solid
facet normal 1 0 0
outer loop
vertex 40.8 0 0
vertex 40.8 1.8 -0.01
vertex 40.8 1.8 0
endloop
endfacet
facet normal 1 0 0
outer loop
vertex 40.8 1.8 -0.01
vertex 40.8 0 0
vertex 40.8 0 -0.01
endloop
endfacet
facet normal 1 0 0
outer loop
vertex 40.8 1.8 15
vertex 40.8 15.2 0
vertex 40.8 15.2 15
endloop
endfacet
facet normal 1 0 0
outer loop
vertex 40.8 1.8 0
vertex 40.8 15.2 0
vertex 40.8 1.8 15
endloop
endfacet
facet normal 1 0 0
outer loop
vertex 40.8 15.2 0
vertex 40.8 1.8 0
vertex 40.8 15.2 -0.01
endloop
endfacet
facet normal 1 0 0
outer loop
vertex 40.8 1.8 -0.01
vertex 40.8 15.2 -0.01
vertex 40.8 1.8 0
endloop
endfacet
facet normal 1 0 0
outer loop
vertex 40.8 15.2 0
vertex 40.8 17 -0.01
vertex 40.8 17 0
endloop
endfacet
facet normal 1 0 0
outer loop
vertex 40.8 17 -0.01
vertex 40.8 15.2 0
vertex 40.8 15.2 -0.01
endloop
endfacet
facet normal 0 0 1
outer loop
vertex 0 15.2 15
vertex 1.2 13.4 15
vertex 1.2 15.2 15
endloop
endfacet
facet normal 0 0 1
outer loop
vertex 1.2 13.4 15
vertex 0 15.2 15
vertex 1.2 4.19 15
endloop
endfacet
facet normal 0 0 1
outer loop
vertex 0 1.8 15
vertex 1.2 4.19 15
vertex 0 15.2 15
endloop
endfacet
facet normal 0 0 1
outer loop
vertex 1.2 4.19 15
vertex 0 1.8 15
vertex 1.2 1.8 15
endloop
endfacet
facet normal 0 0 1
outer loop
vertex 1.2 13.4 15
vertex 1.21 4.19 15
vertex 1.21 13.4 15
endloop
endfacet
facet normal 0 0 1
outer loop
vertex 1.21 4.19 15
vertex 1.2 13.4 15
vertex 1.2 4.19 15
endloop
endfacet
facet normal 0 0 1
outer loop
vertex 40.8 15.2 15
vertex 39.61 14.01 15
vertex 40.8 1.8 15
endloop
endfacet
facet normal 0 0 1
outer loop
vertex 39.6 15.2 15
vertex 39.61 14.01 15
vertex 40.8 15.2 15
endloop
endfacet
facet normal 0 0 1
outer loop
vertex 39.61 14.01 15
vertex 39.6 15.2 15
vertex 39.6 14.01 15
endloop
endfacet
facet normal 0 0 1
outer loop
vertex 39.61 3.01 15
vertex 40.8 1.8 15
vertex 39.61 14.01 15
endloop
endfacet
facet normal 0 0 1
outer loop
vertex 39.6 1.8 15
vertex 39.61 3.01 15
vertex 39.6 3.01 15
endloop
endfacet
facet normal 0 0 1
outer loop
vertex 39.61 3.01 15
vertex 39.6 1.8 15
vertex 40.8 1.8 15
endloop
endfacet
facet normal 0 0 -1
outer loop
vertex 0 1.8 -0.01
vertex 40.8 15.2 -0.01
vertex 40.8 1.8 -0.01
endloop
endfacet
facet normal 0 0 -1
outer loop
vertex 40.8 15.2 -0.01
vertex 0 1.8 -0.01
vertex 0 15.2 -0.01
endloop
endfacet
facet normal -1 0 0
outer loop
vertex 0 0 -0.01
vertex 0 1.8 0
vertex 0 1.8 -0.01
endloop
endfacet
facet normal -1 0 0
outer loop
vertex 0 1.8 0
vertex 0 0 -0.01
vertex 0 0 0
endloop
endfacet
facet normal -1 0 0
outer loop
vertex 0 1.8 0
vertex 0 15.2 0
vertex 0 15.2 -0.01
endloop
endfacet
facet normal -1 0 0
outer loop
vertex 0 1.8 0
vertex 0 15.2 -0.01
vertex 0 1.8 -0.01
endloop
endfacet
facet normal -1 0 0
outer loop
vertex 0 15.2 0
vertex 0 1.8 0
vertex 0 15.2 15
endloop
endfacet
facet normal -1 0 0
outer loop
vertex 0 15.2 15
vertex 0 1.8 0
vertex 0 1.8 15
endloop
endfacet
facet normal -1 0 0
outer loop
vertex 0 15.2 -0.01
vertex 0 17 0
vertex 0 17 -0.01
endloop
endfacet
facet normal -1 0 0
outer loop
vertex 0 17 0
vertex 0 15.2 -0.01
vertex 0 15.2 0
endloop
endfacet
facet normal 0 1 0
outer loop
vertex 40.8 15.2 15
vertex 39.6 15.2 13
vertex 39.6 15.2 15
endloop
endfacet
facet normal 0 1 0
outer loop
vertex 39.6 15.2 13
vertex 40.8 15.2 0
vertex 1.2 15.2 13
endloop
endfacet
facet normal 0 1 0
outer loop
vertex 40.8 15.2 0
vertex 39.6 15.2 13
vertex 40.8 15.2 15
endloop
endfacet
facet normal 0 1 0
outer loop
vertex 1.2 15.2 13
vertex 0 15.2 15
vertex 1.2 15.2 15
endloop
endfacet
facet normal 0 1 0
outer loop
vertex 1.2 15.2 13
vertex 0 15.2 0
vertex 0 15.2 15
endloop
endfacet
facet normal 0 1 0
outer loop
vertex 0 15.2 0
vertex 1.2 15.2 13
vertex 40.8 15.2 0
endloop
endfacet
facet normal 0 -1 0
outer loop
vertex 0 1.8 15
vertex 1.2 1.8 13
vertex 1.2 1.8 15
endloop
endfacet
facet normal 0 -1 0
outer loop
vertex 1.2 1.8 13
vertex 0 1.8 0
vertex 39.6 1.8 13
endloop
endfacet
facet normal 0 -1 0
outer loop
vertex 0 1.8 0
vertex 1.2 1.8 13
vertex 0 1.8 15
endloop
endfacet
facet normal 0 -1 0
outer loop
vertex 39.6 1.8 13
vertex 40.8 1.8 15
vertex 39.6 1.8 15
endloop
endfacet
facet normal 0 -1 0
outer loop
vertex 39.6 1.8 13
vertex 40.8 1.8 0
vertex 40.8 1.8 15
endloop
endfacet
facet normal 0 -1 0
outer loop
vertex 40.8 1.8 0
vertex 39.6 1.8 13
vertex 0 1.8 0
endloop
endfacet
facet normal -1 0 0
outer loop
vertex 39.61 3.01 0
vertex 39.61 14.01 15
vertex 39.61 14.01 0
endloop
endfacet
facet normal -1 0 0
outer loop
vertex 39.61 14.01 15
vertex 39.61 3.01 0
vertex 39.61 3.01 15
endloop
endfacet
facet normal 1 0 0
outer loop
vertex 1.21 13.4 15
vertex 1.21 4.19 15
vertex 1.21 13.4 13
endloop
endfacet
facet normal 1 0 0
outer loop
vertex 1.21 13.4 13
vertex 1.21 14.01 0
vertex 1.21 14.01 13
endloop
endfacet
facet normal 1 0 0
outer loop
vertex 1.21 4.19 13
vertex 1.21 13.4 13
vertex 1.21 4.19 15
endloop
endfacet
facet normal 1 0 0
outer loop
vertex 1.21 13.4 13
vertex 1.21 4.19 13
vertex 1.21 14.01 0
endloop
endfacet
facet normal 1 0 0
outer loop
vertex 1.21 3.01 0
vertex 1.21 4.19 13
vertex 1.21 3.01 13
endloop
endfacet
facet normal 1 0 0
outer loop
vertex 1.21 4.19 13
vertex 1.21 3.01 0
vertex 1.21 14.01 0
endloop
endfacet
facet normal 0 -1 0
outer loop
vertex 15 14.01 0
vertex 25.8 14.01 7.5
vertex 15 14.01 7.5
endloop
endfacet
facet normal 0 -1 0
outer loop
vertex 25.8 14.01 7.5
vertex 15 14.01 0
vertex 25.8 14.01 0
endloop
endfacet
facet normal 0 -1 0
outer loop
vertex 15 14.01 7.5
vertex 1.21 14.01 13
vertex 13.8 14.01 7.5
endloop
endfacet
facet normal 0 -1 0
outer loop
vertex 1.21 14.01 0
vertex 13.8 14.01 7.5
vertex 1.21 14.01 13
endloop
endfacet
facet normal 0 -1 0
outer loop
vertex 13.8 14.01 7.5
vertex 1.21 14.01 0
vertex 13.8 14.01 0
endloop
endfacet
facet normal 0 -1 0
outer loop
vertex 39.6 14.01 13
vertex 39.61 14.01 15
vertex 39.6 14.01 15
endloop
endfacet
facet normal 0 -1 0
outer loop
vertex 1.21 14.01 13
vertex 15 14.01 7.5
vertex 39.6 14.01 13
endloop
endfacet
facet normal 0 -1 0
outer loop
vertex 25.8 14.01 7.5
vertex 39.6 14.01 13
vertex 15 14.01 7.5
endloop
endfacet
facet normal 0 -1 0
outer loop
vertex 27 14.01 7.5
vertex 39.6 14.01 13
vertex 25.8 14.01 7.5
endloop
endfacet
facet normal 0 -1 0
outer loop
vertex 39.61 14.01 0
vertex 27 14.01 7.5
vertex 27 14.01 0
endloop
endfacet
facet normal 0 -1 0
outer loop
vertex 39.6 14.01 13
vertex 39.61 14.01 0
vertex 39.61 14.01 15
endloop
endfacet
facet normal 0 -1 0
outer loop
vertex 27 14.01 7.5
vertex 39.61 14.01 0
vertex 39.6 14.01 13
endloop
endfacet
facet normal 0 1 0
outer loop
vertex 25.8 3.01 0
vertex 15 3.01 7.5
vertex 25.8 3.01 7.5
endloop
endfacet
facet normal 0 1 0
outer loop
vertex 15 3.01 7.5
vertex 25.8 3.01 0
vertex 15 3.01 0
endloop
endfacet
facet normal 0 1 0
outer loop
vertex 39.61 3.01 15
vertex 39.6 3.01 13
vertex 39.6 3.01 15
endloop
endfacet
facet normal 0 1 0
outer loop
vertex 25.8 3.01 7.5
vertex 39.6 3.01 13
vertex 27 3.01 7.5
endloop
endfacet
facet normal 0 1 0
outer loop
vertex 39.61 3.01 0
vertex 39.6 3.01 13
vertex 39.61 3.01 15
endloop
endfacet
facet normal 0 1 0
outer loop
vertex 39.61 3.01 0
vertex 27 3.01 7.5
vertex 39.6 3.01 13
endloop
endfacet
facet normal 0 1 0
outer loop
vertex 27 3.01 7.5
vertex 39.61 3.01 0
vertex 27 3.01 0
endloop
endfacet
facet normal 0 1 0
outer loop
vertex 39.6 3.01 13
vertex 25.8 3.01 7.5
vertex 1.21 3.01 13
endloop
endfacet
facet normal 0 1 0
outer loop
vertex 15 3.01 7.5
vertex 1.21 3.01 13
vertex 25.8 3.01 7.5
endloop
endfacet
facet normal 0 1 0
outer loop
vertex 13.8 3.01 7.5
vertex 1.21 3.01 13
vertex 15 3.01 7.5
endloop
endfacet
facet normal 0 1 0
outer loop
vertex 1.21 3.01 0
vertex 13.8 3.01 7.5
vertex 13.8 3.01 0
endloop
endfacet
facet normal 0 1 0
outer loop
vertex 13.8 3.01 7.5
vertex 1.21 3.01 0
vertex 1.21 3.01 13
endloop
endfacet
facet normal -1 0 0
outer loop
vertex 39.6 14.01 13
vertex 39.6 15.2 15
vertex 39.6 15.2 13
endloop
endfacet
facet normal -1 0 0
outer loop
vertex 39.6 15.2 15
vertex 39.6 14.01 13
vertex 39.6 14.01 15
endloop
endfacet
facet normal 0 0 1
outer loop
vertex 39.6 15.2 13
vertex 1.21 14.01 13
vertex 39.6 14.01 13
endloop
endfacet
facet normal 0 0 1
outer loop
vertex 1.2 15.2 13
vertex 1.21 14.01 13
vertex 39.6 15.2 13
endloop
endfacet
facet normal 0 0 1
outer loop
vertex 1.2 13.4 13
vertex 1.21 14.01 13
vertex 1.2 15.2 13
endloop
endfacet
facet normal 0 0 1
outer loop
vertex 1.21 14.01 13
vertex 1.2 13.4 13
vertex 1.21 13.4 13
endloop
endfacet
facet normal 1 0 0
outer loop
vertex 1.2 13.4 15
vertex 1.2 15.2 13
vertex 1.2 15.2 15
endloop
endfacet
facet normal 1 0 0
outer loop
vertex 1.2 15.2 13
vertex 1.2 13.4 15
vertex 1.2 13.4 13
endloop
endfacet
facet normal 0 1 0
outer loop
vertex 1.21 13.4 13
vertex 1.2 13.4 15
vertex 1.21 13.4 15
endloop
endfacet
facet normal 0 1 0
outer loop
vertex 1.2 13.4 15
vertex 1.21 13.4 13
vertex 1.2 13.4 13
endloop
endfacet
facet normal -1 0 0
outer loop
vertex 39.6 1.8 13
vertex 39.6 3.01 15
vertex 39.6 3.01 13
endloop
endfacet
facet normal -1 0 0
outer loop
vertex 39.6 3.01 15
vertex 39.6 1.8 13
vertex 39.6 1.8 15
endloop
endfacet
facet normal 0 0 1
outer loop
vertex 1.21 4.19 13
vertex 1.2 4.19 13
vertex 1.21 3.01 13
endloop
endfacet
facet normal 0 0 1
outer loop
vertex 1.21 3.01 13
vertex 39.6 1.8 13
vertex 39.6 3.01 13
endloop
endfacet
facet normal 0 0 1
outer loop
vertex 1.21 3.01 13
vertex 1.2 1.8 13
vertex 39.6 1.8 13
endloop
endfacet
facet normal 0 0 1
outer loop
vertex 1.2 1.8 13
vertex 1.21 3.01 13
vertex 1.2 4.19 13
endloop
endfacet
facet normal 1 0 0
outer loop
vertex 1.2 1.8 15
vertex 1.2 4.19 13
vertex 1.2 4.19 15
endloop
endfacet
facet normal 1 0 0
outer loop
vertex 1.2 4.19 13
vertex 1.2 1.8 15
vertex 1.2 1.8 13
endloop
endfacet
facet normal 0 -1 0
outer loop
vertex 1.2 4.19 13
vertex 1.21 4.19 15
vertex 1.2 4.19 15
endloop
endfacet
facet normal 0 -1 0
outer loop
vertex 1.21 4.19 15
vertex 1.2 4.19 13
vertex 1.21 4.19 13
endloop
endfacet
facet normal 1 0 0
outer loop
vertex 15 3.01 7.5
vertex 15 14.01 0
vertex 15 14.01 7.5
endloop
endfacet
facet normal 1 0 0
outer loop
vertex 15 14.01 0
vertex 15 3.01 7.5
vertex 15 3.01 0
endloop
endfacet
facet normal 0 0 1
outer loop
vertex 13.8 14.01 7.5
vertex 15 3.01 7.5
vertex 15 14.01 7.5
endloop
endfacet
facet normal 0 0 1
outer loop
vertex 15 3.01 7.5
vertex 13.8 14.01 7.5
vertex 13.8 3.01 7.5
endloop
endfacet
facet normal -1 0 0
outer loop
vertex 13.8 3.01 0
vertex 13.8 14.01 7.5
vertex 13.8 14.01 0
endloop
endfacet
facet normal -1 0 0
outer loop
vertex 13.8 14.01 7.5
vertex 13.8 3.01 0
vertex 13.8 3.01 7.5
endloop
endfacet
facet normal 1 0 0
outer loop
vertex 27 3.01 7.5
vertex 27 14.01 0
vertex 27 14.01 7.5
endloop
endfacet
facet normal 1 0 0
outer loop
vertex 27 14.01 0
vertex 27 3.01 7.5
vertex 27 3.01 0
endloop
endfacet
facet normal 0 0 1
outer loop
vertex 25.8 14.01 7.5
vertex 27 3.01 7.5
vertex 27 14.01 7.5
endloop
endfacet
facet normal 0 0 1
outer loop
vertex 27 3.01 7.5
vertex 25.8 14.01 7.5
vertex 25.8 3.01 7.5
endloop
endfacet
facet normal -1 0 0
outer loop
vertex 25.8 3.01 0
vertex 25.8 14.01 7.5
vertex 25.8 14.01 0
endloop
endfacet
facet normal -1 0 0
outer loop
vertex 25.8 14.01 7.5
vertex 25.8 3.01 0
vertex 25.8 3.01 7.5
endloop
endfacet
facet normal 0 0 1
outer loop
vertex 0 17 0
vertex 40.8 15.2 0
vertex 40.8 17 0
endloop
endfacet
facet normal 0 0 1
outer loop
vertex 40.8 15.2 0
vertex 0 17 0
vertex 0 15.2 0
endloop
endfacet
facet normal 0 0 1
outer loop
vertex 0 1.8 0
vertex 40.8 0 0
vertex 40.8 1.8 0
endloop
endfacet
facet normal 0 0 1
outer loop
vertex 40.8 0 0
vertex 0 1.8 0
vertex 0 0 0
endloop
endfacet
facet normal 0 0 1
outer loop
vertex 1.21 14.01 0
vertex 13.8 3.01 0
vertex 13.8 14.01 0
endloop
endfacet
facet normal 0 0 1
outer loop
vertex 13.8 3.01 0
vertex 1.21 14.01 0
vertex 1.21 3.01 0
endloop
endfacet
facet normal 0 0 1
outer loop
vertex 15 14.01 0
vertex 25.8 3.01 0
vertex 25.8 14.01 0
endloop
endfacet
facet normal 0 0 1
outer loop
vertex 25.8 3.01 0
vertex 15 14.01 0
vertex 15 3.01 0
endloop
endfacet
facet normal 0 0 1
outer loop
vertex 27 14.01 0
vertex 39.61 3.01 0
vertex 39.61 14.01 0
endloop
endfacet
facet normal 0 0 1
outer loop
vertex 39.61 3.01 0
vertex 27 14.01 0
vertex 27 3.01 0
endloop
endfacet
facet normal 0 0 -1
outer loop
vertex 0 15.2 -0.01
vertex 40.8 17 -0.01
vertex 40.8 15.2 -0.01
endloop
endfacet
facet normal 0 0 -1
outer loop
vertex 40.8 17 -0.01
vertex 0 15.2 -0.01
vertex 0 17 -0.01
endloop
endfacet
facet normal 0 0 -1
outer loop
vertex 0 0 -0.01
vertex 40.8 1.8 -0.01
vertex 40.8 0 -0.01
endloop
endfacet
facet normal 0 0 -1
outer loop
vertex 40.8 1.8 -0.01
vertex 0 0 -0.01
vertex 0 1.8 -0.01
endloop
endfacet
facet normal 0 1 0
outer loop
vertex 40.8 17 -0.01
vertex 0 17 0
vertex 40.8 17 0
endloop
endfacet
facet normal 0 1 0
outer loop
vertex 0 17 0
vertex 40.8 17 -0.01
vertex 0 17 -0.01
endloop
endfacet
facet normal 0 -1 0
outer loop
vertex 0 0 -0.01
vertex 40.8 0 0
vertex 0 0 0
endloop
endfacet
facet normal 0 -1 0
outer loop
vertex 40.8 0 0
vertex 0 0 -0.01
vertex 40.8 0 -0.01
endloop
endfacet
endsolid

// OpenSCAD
// file: ../Base/Boxes.scad
// Fischertechnik Box Foundation
// Pre-designed Boxes

use <Constants.scad>

include <PlacementOptions.scad>

box190Width = 190;
box190Depth = 130;
box130Width = 130;
box130Depth = 95;

// Values are from an original ec3 box
topBottomDifference = 1.5;
outerHeight = 40;
baseThickness = 1.8;
innerHeight = outerHeight - baseThickness;
stackExcess = 5.7;
radius = 3.5;
wallThickness = 1.5;
tolerance = 0.2;

boxWallThickness = wallThickness;
boxBaseThickness = baseThickness;
boxWebWidth = 3.0;

// getBoxWallThickness()
// Gets the wall thickness of a Fischertechnik Box
function getBoxWallThickness() = boxWallThickness;

// getBoxUsageHeight(height = 38.2)
// Gets the usable height of a Fischertechnik box
// height = Outer height of the box from the bottom to the upper edge.
function getBoxUsageHeight(height = outerHeight) = height - baseThickness - stackExcess;

// getBoxInnerHeight()
// Gets the inner height of a Fischertechnik box, including the stack excess
function getBoxInnerHeight() = innerHeight;

// getBoxBaseThickness()
// Gets the thickness of the Fischertechnik box base.
function getBoxBaseThickness() = boxBaseThickness;

// getBoxWebWidth()
// Gets the width of a box web
function getBoxWebWidth() = boxWebWidth;

// getBox190Space()
// Gets the usable inner space of a Box 190 as an x/y-list
function getBox190Space() = [
    box190Width - 2*getBoxWallThickness() - topBottomDifference, 
    box190Depth - 2*getBoxWallThickness() - topBottomDifference ];

// RoundedCornerPlate(width, depth, height, radius)
// Creates a body plate with rounded corners for a box. Used
// also to create the complete box with the hull module.
// width = Width of the plate
// depth = depth of the plate 
// height = thickness of the plate
// radius = radius of the rounded corner
module RoundedCornerPlate(width, depth, height, radius) {
    translate([radius, radius])
    hull() {
        w = width-2*radius;
        d = depth-2*radius;
        cube([w, d, height]);
        cylinder(height, r=radius, $fn=getFragments());
        translate([w, 0])
            cylinder(height, r=radius, $fn=getFragments());
        translate([w, d])
            cylinder(height, r=radius, $fn=getFragments());
        translate([0, d])
            cylinder(height, r=radius, $fn=getFragments());
    }
}

// BoxBase(width, depth)
// Creates an empty stackable Fischertechnik compatible box
// width = Outer width of the box (190, 130, ...)
// depth = Outer depth of the box (130, 95, ...)

module BoxBase(width, depth, height=outerHeight) {    
    thinPlate = 0.01;

    innerHeight = height - baseThickness;    
    
    module Body(tolerance=tolerance) {
        hull() {
            // Bottom with tolerance to fit into the original boxes when stacked
            translate([-wallThickness+tolerance, -wallThickness+tolerance, -baseThickness])
                RoundedCornerPlate(width-topBottomDifference-2*tolerance, depth-topBottomDifference-2*tolerance, thinPlate, radius);
            
            // Top
            translate([-wallThickness-topBottomDifference/2, -wallThickness-topBottomDifference/2, innerHeight-thinPlate])
                RoundedCornerPlate(width, depth, thinPlate, radius);
         }
    }

    module Cutoff() {
        hull() {
            coWidth = width - 2*wallThickness;
            coDepth = depth - 2*wallThickness;
            
            // Bottom
            RoundedCornerPlate(coWidth-topBottomDifference, coDepth-topBottomDifference, thinPlate, radius);

            // Top
            translate([-topBottomDifference/2, -topBottomDifference/2, innerHeight+thinPlate]) 
                RoundedCornerPlate(coWidth, coDepth, thinPlate, radius);
        }
    }
    
    difference() {        
        Body();
        Cutoff();
        stackOffset = innerHeight - stackExcess;
        translate([0, 0, stackOffset + baseThickness])
            Body(tolerance=0);
    }
}

// Creates the Fischertechnik empty box 130x190 mm and places it at position 0,0
// 190x130 are the outer sizes, the inner space is slightly smaller. Use getBox190Space() to get the inner sizes.
// The box is positioned that the usable inner space is at the 0,0,0 position.

module Box190() {
    BoxBase(box190Width, box190Depth);
}

// Gets the usable inner space of a Box 130 as an x/y-list
function getBox130Space() = [
    box130Width - 2*getBoxWallThickness() - topBottomDifference, 
    box130Depth - 2*getBoxWallThickness() - topBottomDifference ];

// Creates the Fischertechnik empty box 95x130 mm and places it at position 0,0
// 190x130 are the outer sizes, the inner space is slightly smaller. Use getBox190Space() to get the inner sizes.
// The box is positioned that the usable inner space is at the 0,0,0 position.

module Box130() {
    BoxBase(box130Width, box130Depth);
}

// Creates a web at the specified box walls
// corner 0 = LowerLeft, 1 = UpperLeft, 2 = UpperRight, 3 = LowerRight
// side 0 = LeftOfCorner, 1 = RightOfCorner
// distance = Distance in mm from the corner
// boxSpace = inner width and depth of the box (default: Box 190)
// webWidth = length of the web (default is 3 mms)
// webThickness = thickness of the web (default is 1 mm)
// height = Height of the web (standard is getBoxUsageHeight())
// sink = How much of the web is sunk into the wall

module BoxWeb(
    corner, 
    side, 
    distance, 
    boxSpace=getBox190Space(), 
    webWidth=getBoxWebWidth(), 
    webThickness=1.0, 
    height=getBoxUsageHeight(),
    sink = getBoxWallThickness()/2) {
    width = (corner % 2 == 0) ? 
            (side == LeftOfCorner ? webWidth : webThickness) :
            (side == LeftOfCorner ? webThickness : webWidth);

    depth = (corner % 2 == 0) ? 
            (side == RightOfCorner ? webWidth : webThickness) :
            (side == RightOfCorner ? webThickness : webWidth);
    
    xDiff = corner == LowerLeft ? 
                (side == LeftOfCorner ? -sink : distance) :
            (corner == UpperLeft ?                
                (side == LeftOfCorner ? distance : -sink) :
            (corner == UpperRight ?
                (side == LeftOfCorner ? boxSpace.x-webWidth+sink : boxSpace.x-distance-webThickness) :
                (side == LeftOfCorner ? boxSpace.x-distance-webThickness: boxSpace.x-webWidth+sink)));

    yDiff = corner == LowerLeft ? 
                (side == RightOfCorner ? -sink : distance) :
            (corner == UpperLeft ?
                (side == RightOfCorner ? boxSpace.y-distance-webThickness : boxSpace.y-webWidth+sink) :
            (corner == UpperRight ?
                (side == RightOfCorner ? boxSpace.y-webWidth+sink : boxSpace.y-distance-webThickness) :
                (side == RightOfCorner ? distance : -sink)));
    
    translate([xDiff, yDiff, -getExcess()])
        cube([width, depth, height + 2*getExcess()]);
}
// file: ../Base/Rotation.scad
// Fischertechnik Box Foundation
// Geometry Helpers Rotation

include <PlacementOptions.scad>

// getRotatedSpace(space, rotation=NoRotation)
// Rotates the space dependent on the specified rotation

function getRotatedSpace(space, rotation=NoRotation) = [
    (rotation == Rotate90 || rotation == Rotate270) ? space.y : space.x,
    (rotation == Rotate90 || rotation == Rotate270) ? space.x : space.y
];

// Rotates the given space around the fixed left lower corner
// space = the space the children needs as width/depth list [width,depth]
// rotation = 0 Rotate0 degrees, 1 Rotate90 degrees, 2 Rotate180 degrees, 3 Rotate270 degrees (equivalent to -90)

module RotateFix(space, rotation=NoRotation) {
    dy = (rotation == Rotate0 || rotation == Rotate270) ? 0 :
        (rotation == Rotate90) ? space.x :
        space.y;
    dx = (rotation < Rotate180) ? 0 :
        (rotation == Rotate180) ? space.x :
        space.y;
    
    translate([dx, dy, 0])
        rotate([0, 0, rotations[rotation]])
            children();
}
// file: ../Base/Alignment.scad
// Fischertechnik Box Foundation
// Geometry Helpers Alignment

include <PlacementOptions.scad>

// getAlignedX(elementWidth, spaceWidth, align=AlignRight, offset=0)
// Gets the aligned X offset of an element with the given
// width in the given space.
// elementWidth = The width of the element to positon
// spaceWidth = The space where the element should be aligned
// align = 0 AlignLeft, 1 AlignCenter, 2 AlignRight
// offset = an optional offset from the aligned position. When
// aligned left or centered, then positive values are in X direction.
// When aligned right then positive values are in negative X direction.

function getAlignedX(elementWidth, spaceWidth, align=AlignRight, offset=0) =
    (align == AlignLeft) ?
        offset :
        ((align == AlignCenter) ?
        (spaceWidth - elementWidth)/2 + offset :
        spaceWidth - offset - elementWidth);

// getAlignedY(elementDepth, spaceDepth, align=AlignTop, offset=0)
// Gets the aligned Y offset of an element with the given
// depth in the given space.
// elementDepth = The depth of the element to positon
// spaceDepth = The space where the element should be aligned
// align = 0 AlignBottom, 1 AlignCenter, 2 AlignTop
// offset = an optional offset from the aligned position. When
// aligned bottom or centered, then positive values are in Y direction.
// When aligned top then positive values are in negative Y direction.

function getAlignedY(elementDepth, spaceDepth, align=AlignTop, offset=0) =
    (align == AlignBottom) ?
        offset :
        ((align == AlignCenter) ?
        (spaceDepth - elementDepth)/2 + offset :
        spaceDepth - offset - elementDepth);
// file: ../Base/PlacementOptions.scad
// Fischertechnik Box Foundation
// Placement Options

// Alignment
NoAlign = 0;
AlignLeft = 1;
AlignBottom = 2;
AlignCenter = 3;
AlignRight = 4;
AlignTop = 5;

// Element rotation degree steps
rotations = [0, -90, -180, -270];

// Rotation
NoRotation = 0;
Rotate0 = 0;
Rotate90 = 1;
Rotate180 = 2;
Rotate270 = 3;

// Docking (seen from above)
NoDock = -1;
DockLeft = 0;
DockTop = 1;
DockRight = 2;
DockCorner = 2;
DockBottom = 3;

// Web corners
LowerLeft = 0;
UpperLeft = 1;
UpperRight = 2;
LowerRight = 3;

// Web position relative to corner
LeftOfCorner = 0;
RightOfCorner = 1;

// Rails direction
Horizontal = true;
Vertical = false;
// file: ../Base/Placement.scad
// Fischertechnik Box Foundation
// Geometry Helpers Placement

use <Constants.scad>
use <Alignment.scad>
use <Rotation.scad>
use <Boxes.scad>

include <PlacementOptions.scad>

// Place(x=0, y=0, elementSpace=[0,0], alignX=AlignLeft, alignY=AlignBottom, rotation=Rotate0, boxSpace=getBox190Space())
// Places the child at the specified position
// y = Y-Position. This is a relative position when an X aligment is specified.
// x = X-Position. This is a relative position when an Y aligment is specified.
// elementSpace = space of the element to be placed [x,y]
// alignX = -1=NoAlign, 0 AlignLeft, 1 AlignCenter, 3 AlignRight (elementSpace and boxSpace required!)
// alignY = -1=NoAlign, 2 AlignBottom, 1 AlignCenter, 4 AlignTop (elementSpace and boxSpace required!)
// rotation = 0 Rotate0 0 degrees, 1 Rotate90 90 degrees, 
// 2 Rotate180 180 degrees, 3 Rotate270 270 degrees (equivalent to -90)
// boxSpace = Inner space of the box where the placement occurs [x,y] - default is Box 190x130 inner space

module Place(x=0, y=0, elementSpace=[0,0], 
  alignX=AlignLeft, alignY=AlignBottom, 
  rotation=NoRotation, boxSpace=getBox190Space()) {

    module Position(x, y, space, rotation=Rotate0) {
        translate([x, y, 0])
            RotateFix(space, rotation)
                children();
    }

    space = getRotatedSpace(elementSpace, rotation);
    alignedX = getAlignedX(space.x, boxSpace.x, alignX, x);
    alignedY = getAlignedY(space.y, boxSpace.y, alignY, y);
    Position(alignedX, alignedY, elementSpace, rotation)
        children();
}

// Center(space=getBox130Space(), elementSpace=[0,0])
// space = Space where the children is centered. For cylinder use centered=true and no elementSpace.
// elementSpace = space of the element to be centered [x,y]

module Center(space=getBox190Space(), elementSpace=[0,0]) {
    Place(elementSpace=elementSpace, boxSpace=space, alignX=AlignCenter, alignY=AlignCenter)
        children();
}

// CenterHorizontal(width=0, y=0, offset=0, space=getBox130Space())
// width = Width of the element to be placed.
// y = Y position of the element
// offset = Offset from the center position (negative will be left of the center)
// space = Space where the element is placed

module CenterHorizontal(width=0, y=0, offset=0, space=getBox190Space()) {
    Place(x=offset, y=y, elementSpace=[width, 0], boxSpace=space, alignX=AlignCenter)
        children(0);
}

// CenterVertical(depth=0, x=0, offset=0, space=getBox130Space())
// depth = Depth of the element to be placed.
// x = X position of the element
// offset = Offset from the center position (negative will be down of the center)
// space = Space where the element is placed

module CenterVertical(depth=0, x=0, offset=0, space=getBox190Space()) {
    Place(x=x, y=offset, elementSpace=[0, depth], boxSpace=space, alignY=AlignCenter)
        children(0);
}

// getIsVertical(align)
// True if the specified alignment needs a vertical orientation for a divider (AlignRight, AlignLeft)

function getIsVertical(align) = (align == AlignRight || align == AlignLeft);

// getIsHorizontal(align)
// True if the specified alignment needs a horizontal orientation for a divider (AlignTop, AlignBottom)

function getIsHorizontal(align) = (align == AlignTop || align == AlignBottom);
// file: ../Base/Constants.scad
// Fischertechnik Box Foundation
// Constants

// Constant values necessary for multiple elements

// Base constants
dividerThickness = 1.2;
excess = 0.01;
fragments = 90;
tolerance = 0.8;

// Gets the thickness of a divider 
function getDividerThickness() = dividerThickness;

// Gets the excess that is used to merge walls into each other
function getExcess() = excess;

// Gets amount of fragments of a cylinder
function getFragments() = fragments;

// Gets the inner tolerance of a frame to each side
function getTolerance() = tolerance;


// Fischertechnik specific constants
axisDiameter = 4;
axisBottomDiameter = axisDiameter + 1;
axisTolerance = 0.2;

// Gets axis diameter of Fischertechnik axis
function getAxisDiameter() = axisDiameter;

// Gets axis diameter tolerance (subtracted for element axis)
function getAxisTolerance() = axisTolerance;

// Gets the axis diameter for standing axis
function getStandAxisDiameter() = getAxisDiameter() - getAxisTolerance();

// Gets axis bottom diameter for thicker part at the bottom
function getAxisBottomDiameter() = axisBottomDiameter;

pinHeight = 2.5;
pinTolerance = 0.2;

// gets the height of a connecting pin
function getPinHeight() = pinHeight;

// gets the connecting pin height tolerance
function getPinTolerance() = pinTolerance;

standardEdgeDistance = 2.5;
standardWebDistance = 11.5;
standardCornerLength = 15;

// gets the standard distance to the wall of the box for dockable frames with webs
function getStandardEdgeDistance() = standardEdgeDistance;

// gets the standard distance of each web to the corner of the dockable frame
function getStandardWebDistance() = standardWebDistance;

// gets the standard length of the corner walls of a dockable frame
function getStandardCornerLength() = standardCornerLength;

tubeWallFactor = 0.8;

// gets the wall thickness of a tube.
function getTubeWallThickness() = tubeWallFactor * getDividerThickness();

smallPartsFrameHeight = 20;

// gets the frame height for docked small parts boxes.
function getSmallPartsFrameHeight() = smallPartsFrameHeight;

hubRingDiameter = 19.5;
hubRingLevelDiameter = 21;

// gets the diameter of a tube matching the inner ring of a wheel
function getHubRingDiameter() = hubRingDiameter;

// gets the diameter of a hub tube with a thicker diameter
function getHubRingLevelDiameter() = hubRingLevelDiameter;
// main file
// Fischertechnik Box Library
// Frame for gear rack 30 for mini-motor lifting gear
// 37457

use <../ModelBase/Complex.scad>

// getFrameGearRack30Space()
// Gets the space of a frame for the gear rack 30 for mini-motor lifting gear
// dock = true, if the frame should be docked to the wall at the left side

function getFrameGearRack30Space(dock=false) = getGearRackSpace(dock=dock);

// FrameGearRack30()
// Frame for the gear rack 30 for mini-motor lifting gear
// dock = true, if the frame should be docked to the wall at the left side

module FrameGearRack30(dock=false) {
    GearRack(dock=dock);
}

// test
color("lightgray")
FrameGearRack30();
